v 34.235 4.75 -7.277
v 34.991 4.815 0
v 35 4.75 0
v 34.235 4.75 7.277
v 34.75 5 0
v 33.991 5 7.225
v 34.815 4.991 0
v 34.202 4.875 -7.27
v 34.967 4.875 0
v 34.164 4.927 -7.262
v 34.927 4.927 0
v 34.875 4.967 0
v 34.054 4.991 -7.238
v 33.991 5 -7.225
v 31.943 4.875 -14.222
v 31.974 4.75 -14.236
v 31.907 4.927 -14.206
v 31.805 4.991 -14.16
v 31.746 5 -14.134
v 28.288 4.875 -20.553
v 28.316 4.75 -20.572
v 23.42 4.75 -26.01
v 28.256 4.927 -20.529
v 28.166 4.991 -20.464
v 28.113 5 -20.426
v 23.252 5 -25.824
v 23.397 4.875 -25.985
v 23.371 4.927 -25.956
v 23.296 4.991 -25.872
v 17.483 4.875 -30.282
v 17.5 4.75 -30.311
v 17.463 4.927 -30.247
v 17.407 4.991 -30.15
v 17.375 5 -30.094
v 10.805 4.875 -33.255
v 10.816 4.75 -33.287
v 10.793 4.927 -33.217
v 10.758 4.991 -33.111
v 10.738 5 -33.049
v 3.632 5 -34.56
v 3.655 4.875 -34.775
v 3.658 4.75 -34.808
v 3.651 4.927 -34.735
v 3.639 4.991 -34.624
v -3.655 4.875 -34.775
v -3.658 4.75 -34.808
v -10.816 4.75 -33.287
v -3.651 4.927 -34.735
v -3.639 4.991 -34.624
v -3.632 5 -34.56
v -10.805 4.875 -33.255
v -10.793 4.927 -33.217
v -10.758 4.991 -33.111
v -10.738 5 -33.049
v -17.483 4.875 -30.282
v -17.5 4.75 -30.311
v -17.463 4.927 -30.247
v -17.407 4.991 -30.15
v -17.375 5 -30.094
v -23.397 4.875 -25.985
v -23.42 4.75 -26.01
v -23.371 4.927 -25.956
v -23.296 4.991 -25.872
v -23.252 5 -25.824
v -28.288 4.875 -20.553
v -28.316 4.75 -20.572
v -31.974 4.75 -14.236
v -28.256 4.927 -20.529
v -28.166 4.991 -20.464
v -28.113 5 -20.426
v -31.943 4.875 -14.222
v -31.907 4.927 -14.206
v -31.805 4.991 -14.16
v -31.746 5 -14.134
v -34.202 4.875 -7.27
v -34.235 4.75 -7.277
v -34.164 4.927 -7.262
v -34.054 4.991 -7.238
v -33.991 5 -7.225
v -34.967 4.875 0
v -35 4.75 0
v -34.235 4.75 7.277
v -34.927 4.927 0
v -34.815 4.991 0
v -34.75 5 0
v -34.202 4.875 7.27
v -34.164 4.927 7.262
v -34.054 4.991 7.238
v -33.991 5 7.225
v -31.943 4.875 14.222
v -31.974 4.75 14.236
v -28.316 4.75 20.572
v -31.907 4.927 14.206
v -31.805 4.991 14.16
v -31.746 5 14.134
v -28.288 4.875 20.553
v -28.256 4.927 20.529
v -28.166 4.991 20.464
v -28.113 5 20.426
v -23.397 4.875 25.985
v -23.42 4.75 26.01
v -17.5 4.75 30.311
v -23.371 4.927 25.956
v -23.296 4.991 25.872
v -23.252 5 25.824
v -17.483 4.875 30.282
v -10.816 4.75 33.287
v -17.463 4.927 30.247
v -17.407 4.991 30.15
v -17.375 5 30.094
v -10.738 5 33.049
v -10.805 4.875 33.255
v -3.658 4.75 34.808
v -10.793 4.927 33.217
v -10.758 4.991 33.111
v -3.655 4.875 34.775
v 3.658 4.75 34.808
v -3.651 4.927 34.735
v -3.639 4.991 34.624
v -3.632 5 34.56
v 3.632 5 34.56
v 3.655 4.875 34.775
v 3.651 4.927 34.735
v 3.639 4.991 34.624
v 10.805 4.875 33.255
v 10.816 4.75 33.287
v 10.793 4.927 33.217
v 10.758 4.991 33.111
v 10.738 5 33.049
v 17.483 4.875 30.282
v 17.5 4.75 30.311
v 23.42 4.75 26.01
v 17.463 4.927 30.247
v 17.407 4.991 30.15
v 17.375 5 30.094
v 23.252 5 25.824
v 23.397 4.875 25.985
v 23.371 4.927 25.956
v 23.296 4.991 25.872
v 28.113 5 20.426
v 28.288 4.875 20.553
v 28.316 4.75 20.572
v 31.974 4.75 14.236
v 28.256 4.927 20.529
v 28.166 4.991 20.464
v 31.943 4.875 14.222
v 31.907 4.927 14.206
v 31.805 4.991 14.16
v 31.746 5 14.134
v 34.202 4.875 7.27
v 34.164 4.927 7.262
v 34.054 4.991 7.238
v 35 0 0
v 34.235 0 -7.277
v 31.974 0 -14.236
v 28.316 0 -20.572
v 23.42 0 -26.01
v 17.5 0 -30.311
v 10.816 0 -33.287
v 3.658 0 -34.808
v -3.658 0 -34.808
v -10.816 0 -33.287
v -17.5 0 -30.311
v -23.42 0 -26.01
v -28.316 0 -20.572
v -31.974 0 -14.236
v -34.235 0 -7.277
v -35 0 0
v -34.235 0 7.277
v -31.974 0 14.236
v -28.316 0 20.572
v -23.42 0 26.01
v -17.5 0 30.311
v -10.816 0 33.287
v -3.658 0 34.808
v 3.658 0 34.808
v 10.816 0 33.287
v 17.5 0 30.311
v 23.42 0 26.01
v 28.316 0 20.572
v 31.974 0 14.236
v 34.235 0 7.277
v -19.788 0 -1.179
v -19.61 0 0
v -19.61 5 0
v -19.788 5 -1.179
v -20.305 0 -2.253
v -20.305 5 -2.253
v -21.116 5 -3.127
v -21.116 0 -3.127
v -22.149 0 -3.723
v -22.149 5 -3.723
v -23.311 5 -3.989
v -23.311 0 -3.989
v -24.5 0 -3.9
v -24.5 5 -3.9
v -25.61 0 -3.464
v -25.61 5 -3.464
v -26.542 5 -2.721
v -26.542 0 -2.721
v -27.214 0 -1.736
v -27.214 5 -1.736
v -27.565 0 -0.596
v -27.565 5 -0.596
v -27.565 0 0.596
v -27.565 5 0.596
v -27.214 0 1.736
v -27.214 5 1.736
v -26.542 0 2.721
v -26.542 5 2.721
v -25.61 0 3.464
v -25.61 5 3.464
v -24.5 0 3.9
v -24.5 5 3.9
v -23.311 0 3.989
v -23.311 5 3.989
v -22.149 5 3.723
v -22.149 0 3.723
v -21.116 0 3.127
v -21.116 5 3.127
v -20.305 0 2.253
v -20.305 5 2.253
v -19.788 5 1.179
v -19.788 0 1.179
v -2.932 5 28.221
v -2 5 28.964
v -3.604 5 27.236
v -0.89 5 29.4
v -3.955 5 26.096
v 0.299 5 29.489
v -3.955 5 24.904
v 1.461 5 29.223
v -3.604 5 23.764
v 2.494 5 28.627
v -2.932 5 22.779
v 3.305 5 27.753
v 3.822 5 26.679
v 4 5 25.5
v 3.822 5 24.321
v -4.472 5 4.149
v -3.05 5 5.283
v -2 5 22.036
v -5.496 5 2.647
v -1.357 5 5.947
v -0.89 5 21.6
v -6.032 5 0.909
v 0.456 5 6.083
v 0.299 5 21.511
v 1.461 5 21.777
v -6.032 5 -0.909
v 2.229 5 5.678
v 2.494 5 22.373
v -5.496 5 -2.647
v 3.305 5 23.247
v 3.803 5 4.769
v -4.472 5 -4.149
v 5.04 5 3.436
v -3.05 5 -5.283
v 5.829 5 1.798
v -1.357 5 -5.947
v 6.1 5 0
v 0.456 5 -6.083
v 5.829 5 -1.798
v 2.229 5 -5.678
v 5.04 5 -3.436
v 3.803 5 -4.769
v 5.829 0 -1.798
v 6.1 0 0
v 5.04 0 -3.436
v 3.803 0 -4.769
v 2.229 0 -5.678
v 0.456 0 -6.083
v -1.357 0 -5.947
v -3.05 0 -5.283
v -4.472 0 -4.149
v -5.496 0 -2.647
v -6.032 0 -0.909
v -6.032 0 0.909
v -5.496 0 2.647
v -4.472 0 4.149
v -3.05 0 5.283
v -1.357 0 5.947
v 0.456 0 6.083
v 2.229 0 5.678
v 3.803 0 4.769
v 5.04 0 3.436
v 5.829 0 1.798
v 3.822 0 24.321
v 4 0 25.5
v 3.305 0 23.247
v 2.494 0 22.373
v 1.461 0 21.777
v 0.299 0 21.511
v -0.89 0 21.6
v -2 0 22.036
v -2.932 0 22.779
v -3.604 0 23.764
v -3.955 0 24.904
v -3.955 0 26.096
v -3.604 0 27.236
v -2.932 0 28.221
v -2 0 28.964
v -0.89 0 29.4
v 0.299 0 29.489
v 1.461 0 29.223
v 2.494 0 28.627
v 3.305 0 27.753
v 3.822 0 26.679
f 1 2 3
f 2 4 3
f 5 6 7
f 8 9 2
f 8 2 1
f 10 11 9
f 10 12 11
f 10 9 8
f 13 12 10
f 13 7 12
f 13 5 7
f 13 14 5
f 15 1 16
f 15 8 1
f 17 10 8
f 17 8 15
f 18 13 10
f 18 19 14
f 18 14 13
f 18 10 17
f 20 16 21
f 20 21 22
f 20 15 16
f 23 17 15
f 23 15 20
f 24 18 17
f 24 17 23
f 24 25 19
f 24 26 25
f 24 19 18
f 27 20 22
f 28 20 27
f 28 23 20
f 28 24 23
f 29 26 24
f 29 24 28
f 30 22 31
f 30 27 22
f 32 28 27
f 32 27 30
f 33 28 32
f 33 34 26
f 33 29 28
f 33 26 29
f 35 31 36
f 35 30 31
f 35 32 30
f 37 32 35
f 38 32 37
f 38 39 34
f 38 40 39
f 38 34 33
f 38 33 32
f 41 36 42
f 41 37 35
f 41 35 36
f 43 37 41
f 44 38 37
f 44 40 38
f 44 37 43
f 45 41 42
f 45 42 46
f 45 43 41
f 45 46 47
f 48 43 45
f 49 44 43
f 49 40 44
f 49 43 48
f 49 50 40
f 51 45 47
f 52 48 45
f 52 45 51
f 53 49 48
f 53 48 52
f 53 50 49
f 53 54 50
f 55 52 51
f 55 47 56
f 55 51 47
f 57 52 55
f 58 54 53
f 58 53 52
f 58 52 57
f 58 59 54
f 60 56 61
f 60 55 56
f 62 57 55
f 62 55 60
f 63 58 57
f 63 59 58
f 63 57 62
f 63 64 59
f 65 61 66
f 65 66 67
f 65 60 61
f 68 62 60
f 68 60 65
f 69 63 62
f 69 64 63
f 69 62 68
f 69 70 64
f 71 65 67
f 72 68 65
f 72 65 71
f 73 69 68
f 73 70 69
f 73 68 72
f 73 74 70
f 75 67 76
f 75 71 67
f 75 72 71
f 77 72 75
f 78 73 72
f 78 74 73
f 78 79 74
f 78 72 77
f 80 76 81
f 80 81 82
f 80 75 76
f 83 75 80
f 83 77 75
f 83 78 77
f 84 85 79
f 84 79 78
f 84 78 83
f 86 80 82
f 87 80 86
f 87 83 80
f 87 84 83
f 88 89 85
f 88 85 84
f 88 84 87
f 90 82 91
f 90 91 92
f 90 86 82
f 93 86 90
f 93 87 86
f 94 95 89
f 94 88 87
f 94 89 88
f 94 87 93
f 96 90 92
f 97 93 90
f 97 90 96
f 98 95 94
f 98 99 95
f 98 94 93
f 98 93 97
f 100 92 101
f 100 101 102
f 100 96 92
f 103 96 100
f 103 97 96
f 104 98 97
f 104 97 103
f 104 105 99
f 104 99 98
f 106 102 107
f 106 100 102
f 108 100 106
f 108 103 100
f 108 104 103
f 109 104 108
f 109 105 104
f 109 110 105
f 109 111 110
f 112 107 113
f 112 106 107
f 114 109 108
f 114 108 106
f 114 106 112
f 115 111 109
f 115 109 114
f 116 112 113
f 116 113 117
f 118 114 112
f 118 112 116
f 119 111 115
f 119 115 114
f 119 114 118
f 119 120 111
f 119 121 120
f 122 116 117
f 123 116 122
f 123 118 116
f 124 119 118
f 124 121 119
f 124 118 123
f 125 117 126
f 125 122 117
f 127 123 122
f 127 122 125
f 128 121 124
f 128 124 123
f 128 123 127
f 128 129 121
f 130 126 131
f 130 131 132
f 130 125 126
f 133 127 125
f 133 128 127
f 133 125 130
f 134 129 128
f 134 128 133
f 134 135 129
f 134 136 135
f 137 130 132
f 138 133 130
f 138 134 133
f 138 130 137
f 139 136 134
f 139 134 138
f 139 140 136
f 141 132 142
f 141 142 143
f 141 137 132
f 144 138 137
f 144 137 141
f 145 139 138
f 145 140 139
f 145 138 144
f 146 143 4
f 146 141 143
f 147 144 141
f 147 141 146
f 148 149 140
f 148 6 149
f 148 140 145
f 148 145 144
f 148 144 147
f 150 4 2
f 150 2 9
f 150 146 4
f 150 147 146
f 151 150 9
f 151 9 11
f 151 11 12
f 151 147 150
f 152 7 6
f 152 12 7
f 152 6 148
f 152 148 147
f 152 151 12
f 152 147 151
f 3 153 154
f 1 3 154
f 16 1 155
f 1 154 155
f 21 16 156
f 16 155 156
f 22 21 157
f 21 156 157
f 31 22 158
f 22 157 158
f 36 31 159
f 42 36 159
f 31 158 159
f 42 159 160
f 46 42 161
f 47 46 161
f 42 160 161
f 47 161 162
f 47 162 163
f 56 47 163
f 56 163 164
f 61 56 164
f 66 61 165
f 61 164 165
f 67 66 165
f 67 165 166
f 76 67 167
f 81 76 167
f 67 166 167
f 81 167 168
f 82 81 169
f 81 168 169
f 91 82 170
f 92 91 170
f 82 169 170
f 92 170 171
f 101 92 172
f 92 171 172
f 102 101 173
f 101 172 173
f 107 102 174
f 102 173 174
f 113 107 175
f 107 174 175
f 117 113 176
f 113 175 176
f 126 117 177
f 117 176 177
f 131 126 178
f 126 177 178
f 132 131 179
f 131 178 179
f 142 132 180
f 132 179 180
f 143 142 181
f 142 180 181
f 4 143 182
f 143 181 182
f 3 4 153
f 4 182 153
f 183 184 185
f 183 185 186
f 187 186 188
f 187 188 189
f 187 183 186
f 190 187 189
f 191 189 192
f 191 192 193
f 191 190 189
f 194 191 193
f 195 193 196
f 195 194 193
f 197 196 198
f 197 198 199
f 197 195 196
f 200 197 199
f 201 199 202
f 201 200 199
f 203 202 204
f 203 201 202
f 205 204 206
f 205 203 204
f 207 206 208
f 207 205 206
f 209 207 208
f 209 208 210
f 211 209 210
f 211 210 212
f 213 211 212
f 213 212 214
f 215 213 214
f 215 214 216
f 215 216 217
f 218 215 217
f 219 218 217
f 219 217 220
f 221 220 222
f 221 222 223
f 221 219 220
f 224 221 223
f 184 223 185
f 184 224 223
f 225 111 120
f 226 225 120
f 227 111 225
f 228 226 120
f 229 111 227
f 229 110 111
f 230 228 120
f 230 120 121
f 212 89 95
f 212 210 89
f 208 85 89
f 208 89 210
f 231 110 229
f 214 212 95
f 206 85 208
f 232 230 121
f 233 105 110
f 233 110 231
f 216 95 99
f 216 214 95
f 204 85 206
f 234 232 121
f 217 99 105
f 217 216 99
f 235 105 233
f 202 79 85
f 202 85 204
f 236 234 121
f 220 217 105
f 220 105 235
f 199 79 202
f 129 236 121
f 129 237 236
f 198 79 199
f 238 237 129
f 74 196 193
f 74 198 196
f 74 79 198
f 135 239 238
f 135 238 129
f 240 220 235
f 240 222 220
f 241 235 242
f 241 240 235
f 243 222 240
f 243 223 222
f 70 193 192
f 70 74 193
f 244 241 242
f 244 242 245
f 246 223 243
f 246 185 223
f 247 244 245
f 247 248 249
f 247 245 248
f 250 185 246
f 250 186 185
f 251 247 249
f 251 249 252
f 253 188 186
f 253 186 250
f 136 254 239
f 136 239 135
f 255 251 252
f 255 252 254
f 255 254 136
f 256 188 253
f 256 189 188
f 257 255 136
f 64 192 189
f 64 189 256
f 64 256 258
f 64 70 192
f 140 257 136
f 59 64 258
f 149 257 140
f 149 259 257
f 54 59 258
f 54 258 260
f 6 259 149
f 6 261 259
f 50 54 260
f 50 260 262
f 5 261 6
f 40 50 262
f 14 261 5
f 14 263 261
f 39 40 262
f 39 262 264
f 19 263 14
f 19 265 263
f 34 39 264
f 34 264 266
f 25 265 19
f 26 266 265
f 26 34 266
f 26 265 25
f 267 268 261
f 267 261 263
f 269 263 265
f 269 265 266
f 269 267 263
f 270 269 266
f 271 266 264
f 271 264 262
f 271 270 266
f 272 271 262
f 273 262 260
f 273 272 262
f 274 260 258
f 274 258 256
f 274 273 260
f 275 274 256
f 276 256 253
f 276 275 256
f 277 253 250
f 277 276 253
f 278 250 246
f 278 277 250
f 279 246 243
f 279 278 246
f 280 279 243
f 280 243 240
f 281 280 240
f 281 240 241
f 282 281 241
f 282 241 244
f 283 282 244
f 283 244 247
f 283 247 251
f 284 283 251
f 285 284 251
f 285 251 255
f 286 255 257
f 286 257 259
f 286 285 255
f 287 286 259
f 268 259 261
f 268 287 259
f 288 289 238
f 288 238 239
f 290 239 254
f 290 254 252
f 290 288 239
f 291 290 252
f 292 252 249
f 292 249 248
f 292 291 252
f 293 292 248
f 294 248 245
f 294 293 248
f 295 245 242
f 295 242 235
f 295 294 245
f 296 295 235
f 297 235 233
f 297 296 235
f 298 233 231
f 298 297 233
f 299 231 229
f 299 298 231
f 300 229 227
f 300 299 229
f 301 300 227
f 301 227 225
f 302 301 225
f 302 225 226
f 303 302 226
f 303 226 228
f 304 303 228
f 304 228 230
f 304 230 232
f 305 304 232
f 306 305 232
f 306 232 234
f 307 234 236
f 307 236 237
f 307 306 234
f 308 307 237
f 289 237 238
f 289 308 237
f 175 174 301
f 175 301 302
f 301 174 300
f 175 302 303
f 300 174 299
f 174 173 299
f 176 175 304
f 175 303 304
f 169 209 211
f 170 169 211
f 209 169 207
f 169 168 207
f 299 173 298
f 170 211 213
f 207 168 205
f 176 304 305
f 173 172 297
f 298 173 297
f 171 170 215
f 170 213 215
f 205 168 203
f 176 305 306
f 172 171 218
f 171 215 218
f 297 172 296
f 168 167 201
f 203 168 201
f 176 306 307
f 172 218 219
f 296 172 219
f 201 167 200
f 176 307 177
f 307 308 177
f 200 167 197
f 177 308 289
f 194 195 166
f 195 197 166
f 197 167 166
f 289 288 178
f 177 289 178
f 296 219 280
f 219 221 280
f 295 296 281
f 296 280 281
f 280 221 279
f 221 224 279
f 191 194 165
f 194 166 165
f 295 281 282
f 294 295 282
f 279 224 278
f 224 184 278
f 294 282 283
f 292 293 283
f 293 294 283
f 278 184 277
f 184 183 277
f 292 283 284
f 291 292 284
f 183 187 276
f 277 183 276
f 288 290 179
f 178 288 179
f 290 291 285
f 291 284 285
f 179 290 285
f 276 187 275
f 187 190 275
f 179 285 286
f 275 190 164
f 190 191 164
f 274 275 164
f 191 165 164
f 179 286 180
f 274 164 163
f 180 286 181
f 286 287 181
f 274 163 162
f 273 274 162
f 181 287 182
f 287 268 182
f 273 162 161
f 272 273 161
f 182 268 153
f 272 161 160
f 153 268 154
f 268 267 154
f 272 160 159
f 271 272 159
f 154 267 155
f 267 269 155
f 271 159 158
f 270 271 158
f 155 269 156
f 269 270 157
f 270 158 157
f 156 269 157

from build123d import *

# Parameters (mm, degrees)
SKETCH1_R           = 35
SKETCH1_R_2         = 6.1
SKETCH1_R_3         = 4
BOSS_EXTRUDE2_DEPTH = 5
FILLET1_R           = 0.25


with BuildPart() as part:
    # Sketch1 → Boss-Extrude2 (new body)
    with BuildSketch(Plane(origin=(0, 0, 0), x_dir=(1, 0, 0), z_dir=(0, 1, 0))):
        Circle(SKETCH1_R)
        Circle(SKETCH1_R_2, mode=Mode.SUBTRACT)
        with Locations((-23.61, 0)):
            Circle(SKETCH1_R_3, mode=Mode.SUBTRACT)
        with Locations((0, -25.5)):
            Circle(SKETCH1_R_3, mode=Mode.SUBTRACT)
    extrude(amount=BOSS_EXTRUDE2_DEPTH)

    # Fillet1
    fillet1_edges = [part.edges().sort_by_distance(p)[0] for p in [
        (-35, 5, 0),
    ]]
    fillet(fillet1_edges, radius=FILLET1_R)


solid = part.part
